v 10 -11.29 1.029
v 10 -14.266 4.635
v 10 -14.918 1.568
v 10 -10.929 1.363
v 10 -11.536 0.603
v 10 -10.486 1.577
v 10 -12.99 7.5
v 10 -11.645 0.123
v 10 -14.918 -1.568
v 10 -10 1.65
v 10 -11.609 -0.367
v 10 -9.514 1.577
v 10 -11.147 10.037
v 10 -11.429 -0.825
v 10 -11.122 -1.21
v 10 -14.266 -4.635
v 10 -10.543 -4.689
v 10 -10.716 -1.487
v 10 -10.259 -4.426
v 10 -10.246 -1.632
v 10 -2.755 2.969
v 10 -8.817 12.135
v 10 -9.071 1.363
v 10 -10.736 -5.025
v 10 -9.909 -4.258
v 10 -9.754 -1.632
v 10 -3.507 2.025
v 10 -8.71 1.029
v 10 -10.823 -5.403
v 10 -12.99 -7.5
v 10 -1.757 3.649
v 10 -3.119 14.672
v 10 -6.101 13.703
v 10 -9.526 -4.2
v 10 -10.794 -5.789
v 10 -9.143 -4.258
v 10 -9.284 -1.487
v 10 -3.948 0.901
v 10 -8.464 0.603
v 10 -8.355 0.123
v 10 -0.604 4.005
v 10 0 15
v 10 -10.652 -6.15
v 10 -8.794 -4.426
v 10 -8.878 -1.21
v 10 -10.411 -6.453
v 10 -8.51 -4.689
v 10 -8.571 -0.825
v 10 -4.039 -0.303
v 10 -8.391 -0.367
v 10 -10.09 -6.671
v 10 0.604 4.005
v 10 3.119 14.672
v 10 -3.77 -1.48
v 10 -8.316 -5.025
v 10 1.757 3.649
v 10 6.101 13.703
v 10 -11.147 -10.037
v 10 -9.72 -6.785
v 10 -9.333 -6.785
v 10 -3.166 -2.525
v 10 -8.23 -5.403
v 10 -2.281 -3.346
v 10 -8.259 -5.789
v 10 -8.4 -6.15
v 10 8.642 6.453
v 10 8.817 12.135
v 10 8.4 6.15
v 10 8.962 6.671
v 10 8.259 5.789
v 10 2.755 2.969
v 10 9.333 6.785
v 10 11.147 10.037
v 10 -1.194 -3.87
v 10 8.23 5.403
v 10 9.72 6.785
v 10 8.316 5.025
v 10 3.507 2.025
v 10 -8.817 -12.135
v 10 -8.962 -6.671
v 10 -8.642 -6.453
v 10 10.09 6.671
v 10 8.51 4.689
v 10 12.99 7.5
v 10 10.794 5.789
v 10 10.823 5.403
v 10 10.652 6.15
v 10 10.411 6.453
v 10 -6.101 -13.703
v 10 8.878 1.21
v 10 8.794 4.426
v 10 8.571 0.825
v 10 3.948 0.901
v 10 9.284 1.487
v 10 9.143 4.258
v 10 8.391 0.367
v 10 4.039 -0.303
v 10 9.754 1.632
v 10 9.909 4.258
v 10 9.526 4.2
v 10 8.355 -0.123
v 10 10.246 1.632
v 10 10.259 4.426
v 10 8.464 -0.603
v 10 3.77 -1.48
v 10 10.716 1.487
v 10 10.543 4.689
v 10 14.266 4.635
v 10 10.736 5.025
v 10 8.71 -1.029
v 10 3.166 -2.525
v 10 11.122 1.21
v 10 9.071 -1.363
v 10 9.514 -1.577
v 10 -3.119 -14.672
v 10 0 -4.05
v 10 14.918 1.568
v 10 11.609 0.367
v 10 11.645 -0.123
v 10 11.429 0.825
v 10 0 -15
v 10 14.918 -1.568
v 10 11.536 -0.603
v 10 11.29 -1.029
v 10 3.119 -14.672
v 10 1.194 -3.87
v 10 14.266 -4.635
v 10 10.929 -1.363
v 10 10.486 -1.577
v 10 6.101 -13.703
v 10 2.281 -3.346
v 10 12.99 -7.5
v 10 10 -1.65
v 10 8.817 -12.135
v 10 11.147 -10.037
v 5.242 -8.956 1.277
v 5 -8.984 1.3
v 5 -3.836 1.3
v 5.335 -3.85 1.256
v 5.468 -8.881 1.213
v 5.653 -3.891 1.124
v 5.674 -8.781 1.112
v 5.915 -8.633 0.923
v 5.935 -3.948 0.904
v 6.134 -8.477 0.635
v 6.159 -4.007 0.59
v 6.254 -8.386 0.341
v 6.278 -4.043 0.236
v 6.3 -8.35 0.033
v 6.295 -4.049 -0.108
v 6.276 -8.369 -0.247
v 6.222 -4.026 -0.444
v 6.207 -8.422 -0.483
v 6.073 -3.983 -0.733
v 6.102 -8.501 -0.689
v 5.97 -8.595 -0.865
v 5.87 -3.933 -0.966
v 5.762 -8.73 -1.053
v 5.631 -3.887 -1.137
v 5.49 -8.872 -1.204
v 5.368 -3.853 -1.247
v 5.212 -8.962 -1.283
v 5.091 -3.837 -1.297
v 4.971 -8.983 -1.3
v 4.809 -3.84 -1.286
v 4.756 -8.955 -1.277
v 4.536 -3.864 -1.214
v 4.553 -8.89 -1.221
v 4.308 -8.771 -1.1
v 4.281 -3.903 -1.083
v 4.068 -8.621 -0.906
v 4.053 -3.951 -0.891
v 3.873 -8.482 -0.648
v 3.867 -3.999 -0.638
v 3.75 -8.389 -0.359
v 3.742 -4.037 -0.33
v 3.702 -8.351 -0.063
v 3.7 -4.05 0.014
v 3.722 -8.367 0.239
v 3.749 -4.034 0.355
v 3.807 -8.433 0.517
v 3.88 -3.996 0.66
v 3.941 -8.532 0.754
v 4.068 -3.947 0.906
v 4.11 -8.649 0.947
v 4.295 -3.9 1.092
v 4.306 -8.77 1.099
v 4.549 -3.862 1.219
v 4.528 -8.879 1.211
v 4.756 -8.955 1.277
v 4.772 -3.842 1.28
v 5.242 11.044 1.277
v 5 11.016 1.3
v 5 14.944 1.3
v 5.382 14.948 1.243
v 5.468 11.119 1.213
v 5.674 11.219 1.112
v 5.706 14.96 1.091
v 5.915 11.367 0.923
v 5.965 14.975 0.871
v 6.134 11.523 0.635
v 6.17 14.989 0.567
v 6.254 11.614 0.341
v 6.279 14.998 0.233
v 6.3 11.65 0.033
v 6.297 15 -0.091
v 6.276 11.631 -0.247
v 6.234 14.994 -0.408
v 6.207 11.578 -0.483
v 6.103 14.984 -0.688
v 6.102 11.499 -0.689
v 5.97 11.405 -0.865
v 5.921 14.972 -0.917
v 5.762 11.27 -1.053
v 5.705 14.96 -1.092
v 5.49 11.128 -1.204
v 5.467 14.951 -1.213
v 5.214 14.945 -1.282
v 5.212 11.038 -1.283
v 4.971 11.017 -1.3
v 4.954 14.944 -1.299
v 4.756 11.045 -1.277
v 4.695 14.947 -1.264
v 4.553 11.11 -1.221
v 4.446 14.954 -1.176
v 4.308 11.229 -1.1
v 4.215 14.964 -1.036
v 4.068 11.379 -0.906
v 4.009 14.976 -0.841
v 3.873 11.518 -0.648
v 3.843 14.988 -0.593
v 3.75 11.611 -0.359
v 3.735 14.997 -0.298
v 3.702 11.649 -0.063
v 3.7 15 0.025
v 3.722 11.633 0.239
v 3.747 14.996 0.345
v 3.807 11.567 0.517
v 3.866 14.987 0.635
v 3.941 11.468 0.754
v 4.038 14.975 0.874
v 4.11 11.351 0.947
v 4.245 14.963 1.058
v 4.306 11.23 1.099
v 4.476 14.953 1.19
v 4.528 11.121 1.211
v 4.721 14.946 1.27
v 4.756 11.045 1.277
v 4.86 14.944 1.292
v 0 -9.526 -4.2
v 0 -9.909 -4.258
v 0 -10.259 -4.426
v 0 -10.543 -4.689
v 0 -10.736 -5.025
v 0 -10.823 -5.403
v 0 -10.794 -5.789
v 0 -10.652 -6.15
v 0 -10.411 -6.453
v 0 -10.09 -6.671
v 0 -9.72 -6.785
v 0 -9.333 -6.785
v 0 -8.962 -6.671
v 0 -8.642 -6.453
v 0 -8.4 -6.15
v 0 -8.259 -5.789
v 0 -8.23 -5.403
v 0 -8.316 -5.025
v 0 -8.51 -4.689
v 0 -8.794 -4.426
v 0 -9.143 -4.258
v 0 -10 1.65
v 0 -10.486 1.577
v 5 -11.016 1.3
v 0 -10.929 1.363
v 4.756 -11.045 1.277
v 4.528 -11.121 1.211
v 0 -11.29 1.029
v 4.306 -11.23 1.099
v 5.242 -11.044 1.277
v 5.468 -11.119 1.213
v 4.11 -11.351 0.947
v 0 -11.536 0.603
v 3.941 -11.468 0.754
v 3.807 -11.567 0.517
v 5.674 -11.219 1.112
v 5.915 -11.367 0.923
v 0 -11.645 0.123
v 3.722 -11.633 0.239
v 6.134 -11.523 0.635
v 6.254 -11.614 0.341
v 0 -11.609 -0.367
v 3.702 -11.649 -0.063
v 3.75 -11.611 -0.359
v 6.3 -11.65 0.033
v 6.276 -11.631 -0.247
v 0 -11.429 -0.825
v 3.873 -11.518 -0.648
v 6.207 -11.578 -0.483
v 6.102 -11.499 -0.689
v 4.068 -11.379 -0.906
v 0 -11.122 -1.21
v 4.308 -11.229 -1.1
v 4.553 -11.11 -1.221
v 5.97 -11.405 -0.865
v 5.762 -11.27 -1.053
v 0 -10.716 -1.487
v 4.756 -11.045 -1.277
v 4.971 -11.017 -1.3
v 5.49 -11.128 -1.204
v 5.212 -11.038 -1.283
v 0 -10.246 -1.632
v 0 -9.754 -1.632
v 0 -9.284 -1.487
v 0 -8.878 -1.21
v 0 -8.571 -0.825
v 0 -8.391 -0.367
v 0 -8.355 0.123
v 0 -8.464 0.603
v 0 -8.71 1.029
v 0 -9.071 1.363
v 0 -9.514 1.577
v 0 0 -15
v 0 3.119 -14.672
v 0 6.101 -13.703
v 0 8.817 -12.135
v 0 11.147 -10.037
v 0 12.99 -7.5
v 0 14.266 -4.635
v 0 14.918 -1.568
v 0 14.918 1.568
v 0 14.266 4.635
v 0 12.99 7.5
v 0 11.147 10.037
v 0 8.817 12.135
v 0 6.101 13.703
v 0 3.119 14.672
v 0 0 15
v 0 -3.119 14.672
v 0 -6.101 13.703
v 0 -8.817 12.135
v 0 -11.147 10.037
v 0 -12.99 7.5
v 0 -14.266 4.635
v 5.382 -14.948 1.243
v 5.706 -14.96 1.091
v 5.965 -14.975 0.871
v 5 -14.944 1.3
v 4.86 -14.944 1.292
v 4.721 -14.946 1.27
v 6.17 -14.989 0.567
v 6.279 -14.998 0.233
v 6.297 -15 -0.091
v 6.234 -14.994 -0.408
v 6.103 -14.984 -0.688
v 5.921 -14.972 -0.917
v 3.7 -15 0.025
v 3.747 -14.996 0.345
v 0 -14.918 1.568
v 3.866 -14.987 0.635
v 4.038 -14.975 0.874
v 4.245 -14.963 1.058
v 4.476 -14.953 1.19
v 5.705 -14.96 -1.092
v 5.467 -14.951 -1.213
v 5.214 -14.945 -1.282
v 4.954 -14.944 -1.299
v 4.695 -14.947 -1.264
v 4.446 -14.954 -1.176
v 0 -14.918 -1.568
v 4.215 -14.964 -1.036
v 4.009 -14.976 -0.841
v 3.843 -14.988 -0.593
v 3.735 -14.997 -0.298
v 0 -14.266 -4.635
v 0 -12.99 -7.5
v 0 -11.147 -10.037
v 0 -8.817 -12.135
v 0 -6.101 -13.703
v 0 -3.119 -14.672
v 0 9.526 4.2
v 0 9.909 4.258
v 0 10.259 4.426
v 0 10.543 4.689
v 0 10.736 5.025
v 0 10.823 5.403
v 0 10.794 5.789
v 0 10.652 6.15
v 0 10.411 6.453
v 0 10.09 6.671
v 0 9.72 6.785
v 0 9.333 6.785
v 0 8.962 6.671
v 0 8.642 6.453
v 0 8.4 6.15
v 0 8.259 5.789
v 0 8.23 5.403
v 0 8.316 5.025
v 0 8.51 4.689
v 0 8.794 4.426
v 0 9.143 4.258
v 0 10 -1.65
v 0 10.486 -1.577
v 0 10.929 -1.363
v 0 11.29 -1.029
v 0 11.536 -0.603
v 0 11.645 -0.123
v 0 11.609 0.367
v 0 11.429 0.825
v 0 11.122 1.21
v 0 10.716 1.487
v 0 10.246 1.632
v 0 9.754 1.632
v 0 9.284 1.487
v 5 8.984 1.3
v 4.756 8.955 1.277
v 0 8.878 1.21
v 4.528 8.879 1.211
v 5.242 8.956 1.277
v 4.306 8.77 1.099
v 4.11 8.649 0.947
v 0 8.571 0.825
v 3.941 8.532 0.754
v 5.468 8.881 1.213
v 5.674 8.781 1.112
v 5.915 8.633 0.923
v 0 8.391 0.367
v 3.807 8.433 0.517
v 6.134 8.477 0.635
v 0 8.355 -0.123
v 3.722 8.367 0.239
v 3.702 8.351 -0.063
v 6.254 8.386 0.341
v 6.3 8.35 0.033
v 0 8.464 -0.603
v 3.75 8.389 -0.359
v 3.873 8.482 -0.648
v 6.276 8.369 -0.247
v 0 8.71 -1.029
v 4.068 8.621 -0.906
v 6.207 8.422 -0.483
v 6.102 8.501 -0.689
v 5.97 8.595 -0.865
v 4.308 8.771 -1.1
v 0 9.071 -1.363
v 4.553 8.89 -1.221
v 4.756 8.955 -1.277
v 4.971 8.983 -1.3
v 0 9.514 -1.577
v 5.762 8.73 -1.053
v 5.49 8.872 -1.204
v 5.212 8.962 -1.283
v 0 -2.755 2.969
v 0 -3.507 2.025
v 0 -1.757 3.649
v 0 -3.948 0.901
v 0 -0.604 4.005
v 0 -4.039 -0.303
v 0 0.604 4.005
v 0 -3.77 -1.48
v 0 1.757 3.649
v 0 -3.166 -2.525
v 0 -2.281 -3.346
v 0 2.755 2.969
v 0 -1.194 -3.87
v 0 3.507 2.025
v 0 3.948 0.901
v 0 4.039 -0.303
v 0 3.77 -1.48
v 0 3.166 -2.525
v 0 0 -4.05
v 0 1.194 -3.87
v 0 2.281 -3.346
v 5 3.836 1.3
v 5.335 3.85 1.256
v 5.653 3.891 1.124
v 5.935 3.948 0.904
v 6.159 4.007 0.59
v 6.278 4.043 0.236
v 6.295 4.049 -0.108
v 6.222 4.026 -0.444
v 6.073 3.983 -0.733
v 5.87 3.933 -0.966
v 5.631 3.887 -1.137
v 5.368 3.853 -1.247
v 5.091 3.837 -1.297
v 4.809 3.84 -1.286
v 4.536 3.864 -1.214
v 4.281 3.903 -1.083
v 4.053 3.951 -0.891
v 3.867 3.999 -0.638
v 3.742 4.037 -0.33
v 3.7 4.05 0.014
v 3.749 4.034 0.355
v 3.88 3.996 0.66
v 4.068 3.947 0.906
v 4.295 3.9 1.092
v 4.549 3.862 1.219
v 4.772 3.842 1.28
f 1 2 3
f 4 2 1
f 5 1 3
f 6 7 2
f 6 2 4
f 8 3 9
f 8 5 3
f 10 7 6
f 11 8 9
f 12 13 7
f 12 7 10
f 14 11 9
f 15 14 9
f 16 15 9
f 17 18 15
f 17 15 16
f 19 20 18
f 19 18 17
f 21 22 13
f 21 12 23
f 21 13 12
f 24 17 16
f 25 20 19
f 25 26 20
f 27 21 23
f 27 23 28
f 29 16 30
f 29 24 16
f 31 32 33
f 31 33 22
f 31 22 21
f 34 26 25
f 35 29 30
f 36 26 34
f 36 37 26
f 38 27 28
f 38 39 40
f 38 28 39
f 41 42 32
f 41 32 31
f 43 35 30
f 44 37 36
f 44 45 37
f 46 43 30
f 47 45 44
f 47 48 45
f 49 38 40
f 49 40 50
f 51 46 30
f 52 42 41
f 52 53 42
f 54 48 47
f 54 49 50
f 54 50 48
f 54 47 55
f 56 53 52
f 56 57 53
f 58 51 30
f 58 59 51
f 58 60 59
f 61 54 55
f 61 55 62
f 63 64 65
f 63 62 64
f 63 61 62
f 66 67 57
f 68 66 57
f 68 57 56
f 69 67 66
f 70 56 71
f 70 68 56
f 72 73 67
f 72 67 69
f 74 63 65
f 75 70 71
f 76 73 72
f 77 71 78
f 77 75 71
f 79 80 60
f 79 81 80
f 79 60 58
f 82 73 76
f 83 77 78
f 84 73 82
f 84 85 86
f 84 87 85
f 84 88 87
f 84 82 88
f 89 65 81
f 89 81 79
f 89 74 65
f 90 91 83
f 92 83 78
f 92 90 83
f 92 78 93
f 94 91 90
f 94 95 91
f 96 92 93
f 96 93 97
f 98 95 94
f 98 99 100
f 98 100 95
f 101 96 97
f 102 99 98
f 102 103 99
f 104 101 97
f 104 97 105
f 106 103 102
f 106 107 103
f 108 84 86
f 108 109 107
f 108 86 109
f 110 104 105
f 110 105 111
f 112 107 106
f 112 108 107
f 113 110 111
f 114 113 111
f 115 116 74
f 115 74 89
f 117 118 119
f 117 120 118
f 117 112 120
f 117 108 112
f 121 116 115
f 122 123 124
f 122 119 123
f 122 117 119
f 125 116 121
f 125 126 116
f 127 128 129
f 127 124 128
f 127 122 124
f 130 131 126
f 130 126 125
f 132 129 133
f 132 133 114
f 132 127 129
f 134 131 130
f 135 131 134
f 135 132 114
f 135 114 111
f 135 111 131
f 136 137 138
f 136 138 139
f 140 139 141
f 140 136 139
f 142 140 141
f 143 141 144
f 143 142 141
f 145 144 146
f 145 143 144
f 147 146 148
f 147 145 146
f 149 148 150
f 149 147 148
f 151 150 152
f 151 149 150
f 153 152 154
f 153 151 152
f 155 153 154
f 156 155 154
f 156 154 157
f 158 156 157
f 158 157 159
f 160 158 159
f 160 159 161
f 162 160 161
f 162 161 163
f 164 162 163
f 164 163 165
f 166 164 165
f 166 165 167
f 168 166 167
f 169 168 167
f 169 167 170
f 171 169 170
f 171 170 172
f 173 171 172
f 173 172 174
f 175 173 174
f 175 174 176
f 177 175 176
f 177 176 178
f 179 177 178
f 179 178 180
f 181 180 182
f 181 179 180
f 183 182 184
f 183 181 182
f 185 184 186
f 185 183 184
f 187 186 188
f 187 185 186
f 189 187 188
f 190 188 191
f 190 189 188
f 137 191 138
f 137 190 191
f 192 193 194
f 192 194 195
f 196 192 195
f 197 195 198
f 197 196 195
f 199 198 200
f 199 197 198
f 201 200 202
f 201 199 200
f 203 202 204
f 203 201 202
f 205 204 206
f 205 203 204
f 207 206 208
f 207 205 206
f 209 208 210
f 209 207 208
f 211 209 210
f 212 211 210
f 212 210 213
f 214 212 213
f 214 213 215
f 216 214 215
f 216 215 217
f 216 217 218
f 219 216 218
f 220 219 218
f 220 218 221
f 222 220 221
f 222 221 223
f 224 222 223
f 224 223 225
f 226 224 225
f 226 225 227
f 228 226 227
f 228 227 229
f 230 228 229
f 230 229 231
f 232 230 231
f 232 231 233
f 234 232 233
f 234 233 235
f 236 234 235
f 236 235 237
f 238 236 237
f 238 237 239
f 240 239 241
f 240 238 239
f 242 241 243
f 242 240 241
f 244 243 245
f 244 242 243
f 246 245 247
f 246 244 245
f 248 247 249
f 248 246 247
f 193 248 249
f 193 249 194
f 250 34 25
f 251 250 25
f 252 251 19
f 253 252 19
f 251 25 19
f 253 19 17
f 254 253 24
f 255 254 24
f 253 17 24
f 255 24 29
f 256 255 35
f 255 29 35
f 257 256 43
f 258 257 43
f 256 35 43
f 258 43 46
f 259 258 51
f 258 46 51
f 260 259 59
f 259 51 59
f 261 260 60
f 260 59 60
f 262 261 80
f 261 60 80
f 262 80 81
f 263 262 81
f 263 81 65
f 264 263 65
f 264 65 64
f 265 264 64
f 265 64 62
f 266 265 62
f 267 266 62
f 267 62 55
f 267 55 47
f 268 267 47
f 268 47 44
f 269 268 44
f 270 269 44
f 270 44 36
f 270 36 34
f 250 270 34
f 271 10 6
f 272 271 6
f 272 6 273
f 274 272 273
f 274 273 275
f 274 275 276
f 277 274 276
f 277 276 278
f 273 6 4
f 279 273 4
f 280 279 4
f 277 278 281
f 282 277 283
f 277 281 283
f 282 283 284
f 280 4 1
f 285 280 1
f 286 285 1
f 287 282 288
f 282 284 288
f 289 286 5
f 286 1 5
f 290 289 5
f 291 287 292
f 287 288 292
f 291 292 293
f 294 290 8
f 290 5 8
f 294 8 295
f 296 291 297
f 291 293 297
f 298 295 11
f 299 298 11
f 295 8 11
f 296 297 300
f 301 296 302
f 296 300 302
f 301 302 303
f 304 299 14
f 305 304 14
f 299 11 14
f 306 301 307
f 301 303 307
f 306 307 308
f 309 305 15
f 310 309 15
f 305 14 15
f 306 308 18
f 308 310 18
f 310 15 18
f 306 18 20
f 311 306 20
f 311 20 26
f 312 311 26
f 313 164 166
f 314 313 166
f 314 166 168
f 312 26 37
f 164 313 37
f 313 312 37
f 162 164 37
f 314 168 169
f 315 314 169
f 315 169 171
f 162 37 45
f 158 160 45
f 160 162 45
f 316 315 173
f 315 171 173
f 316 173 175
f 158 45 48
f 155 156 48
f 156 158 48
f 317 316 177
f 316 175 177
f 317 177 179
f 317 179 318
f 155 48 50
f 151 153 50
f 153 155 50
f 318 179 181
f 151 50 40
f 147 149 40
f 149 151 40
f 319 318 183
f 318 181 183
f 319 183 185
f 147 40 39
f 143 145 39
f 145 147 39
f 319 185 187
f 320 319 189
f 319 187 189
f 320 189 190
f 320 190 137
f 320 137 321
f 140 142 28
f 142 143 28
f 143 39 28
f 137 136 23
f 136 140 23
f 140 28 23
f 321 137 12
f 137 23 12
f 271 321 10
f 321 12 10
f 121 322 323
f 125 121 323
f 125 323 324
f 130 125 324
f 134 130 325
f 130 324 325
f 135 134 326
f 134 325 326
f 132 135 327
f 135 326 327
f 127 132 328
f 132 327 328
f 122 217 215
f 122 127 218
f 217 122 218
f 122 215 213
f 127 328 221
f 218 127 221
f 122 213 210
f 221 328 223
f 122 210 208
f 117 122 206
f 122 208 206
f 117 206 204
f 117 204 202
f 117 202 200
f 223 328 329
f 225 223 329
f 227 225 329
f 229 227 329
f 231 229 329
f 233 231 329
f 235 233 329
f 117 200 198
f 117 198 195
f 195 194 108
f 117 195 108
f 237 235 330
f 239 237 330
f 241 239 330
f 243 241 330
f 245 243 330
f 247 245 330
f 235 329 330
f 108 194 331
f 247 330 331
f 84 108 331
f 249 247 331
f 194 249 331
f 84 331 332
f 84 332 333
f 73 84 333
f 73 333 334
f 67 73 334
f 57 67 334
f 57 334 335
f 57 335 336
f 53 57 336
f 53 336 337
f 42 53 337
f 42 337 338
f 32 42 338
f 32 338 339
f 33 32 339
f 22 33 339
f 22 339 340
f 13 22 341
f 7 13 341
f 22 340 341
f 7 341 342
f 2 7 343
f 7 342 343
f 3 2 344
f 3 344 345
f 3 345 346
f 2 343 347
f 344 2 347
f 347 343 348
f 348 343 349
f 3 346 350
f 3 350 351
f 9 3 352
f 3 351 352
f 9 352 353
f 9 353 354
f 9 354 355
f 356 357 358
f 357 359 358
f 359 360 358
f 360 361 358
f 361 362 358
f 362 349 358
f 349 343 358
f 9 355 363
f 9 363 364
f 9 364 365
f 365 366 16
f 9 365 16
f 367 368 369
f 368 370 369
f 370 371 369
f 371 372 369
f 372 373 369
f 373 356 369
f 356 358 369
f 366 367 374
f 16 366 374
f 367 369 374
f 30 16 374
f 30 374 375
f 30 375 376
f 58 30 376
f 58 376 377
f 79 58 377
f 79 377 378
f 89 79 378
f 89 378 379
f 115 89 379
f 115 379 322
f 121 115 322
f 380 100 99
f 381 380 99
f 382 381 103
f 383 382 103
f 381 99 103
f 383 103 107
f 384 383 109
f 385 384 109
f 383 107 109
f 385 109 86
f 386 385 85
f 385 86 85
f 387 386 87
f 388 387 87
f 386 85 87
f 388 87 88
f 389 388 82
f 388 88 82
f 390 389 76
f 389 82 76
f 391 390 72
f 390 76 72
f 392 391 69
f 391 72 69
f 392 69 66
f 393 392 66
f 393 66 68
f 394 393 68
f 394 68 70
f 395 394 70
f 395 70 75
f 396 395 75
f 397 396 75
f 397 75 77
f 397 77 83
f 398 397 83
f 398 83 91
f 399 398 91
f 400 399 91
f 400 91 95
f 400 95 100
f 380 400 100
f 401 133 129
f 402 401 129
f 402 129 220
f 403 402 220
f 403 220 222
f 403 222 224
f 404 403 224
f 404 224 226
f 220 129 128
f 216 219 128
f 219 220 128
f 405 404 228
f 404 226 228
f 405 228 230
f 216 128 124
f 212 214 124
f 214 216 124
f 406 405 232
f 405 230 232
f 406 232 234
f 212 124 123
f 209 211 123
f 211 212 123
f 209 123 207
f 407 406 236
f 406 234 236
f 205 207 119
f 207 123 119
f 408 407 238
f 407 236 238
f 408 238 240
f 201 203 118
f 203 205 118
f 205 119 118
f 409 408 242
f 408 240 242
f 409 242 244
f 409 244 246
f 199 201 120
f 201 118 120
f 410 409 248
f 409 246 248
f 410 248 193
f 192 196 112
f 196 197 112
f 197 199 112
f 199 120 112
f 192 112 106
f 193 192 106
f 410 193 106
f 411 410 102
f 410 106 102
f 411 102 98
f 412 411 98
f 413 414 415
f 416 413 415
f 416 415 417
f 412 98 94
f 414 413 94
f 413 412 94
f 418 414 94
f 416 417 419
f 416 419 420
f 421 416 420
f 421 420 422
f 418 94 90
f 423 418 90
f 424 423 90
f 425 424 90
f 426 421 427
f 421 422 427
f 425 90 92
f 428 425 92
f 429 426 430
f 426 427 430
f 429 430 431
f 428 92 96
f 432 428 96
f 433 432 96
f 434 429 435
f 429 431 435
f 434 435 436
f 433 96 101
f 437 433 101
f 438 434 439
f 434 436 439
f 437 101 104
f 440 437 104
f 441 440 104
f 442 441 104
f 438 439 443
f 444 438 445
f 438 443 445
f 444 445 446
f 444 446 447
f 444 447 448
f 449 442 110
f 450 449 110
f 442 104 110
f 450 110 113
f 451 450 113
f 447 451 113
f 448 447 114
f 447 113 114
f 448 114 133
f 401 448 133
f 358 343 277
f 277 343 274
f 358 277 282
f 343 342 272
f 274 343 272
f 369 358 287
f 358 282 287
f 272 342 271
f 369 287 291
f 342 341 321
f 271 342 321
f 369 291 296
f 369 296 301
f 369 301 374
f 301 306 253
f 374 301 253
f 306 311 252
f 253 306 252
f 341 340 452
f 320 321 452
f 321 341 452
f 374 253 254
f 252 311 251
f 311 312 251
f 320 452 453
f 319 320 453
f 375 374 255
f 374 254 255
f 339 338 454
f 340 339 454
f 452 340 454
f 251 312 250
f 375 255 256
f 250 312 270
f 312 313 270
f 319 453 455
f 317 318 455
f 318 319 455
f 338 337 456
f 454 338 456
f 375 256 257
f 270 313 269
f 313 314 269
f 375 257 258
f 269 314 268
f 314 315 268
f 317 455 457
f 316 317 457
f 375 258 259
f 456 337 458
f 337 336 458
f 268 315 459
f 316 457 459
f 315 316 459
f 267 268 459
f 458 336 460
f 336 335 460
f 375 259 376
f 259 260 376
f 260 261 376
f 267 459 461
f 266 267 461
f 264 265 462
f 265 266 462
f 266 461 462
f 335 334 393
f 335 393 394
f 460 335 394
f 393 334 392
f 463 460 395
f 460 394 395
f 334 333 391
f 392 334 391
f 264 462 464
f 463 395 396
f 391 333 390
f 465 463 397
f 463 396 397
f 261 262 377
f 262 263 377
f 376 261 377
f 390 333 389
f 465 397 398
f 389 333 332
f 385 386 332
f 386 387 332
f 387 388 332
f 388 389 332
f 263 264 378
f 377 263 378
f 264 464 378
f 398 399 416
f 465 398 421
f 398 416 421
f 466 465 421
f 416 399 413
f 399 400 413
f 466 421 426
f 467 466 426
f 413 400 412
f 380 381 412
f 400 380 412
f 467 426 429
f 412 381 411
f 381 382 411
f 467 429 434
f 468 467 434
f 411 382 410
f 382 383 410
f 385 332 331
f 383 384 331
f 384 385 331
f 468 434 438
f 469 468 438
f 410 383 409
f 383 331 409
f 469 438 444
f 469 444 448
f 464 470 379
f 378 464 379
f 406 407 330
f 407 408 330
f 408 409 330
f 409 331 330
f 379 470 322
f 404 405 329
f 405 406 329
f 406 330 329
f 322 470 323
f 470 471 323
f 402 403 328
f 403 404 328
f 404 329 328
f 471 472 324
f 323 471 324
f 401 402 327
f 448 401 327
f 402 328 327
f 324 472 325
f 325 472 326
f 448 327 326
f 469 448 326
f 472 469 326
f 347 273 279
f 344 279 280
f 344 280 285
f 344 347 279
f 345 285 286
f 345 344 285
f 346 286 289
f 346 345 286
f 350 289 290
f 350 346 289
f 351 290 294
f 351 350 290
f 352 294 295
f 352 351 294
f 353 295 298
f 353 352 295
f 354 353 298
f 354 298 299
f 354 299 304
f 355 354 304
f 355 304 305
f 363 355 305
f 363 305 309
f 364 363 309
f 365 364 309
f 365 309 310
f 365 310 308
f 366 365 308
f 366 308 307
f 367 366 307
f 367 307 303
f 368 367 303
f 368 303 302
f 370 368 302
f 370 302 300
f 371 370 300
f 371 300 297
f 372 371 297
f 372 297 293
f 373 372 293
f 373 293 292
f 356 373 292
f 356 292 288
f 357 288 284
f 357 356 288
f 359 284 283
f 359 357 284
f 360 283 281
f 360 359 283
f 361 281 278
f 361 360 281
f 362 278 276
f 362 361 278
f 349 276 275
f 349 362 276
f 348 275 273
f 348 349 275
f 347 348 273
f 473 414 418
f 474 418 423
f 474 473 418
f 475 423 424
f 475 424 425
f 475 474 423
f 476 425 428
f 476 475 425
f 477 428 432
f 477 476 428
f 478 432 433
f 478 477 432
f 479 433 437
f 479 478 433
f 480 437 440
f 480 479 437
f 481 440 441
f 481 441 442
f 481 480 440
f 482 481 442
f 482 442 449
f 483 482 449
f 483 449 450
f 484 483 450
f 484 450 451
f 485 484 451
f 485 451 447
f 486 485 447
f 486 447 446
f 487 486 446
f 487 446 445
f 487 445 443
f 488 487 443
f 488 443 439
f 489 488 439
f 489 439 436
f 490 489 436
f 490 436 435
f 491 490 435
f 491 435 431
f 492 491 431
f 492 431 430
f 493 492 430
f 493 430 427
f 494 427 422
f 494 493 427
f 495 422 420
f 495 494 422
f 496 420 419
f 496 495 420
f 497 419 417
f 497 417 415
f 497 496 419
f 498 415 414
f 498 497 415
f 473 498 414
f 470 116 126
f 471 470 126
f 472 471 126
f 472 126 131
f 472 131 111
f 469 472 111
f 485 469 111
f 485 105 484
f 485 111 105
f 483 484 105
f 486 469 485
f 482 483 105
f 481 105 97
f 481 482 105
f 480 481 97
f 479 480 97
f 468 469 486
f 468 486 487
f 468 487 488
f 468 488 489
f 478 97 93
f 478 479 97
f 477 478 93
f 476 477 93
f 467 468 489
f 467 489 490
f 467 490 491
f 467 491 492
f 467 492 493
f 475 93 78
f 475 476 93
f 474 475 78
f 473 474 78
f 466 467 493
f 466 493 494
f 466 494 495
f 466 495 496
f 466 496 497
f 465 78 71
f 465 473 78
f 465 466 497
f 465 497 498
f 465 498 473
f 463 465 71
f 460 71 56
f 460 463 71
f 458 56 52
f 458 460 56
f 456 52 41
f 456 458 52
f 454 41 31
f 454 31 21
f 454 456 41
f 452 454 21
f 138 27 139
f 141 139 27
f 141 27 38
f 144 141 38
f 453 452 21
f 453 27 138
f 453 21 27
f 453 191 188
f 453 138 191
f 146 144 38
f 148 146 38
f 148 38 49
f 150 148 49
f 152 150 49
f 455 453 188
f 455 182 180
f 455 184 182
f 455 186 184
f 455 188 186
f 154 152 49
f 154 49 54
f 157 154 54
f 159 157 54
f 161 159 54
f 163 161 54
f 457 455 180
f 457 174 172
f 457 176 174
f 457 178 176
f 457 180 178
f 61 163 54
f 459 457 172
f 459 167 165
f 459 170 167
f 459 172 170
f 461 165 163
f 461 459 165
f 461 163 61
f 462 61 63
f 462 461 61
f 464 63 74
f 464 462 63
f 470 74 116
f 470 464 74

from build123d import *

# Parameters (mm, degrees)
SKETCH_1_R               = 15
SKETCH_1_R_2             = 4.05
EXTRUDE_1_DEPTH          = 10
CUT_EXTRUDE_1_DEPTH      = 24.452078799
CUT_EXTRUDE_1_DEPTH_BACK = 24.452078799
SKETCH_2_R               = 1.3
SKETCH_3_R               = 1.65
SKETCH_3_R_2             = 1.3
CUT_EXTRUDE_2_DEPTH      = 24.452078982


with BuildPart() as part:
    # ｽｹｯﾁ1 → ﾎﾞｽ - 押し出し1 (new body)
    with BuildSketch(Plane(origin=(0, 0, 0), x_dir=(0, 0, -1), z_dir=(1, 0, 0))):
        Circle(SKETCH_1_R)
        Circle(SKETCH_1_R_2, mode=Mode.SUBTRACT)
    extrude(amount=EXTRUDE_1_DEPTH)

    # ｽｹｯﾁ2 → ｶｯﾄ - 押し出し1 (cut, two sides: drawn at the far end of the back side and taken through both)
    with BuildSketch(Plane(origin=(0, 0, 0), x_dir=(1, 0, 0), z_dir=(0, 1, 0)).offset(-CUT_EXTRUDE_1_DEPTH_BACK)):
        with Locations(Location((5, 0, 0), (0, 0, 270))):
            Circle(SKETCH_2_R)
    extrude(amount=CUT_EXTRUDE_1_DEPTH + CUT_EXTRUDE_1_DEPTH_BACK, mode=Mode.SUBTRACT)

    # ｽｹｯﾁ3 → ｶｯﾄ - 押し出し2 (cut, through all)
    with BuildSketch(Plane(origin=(10, 0, 0), x_dir=(0, 0, -1), z_dir=(1, 0, 0))):
        with Locations((0, 10)):
            Circle(SKETCH_3_R)
        with Locations(Location((0, -10, 0), (0, 0, 180))):
            Circle(SKETCH_3_R)
        with Locations((-5.5, 9.526279442)):
            Circle(SKETCH_3_R_2)
        with Locations(Location((5.5, -9.526279442, 0), (0, 0, 180))):
            Circle(SKETCH_3_R_2)
    extrude(amount=-CUT_EXTRUDE_2_DEPTH, mode=Mode.SUBTRACT)


solid = part.part
